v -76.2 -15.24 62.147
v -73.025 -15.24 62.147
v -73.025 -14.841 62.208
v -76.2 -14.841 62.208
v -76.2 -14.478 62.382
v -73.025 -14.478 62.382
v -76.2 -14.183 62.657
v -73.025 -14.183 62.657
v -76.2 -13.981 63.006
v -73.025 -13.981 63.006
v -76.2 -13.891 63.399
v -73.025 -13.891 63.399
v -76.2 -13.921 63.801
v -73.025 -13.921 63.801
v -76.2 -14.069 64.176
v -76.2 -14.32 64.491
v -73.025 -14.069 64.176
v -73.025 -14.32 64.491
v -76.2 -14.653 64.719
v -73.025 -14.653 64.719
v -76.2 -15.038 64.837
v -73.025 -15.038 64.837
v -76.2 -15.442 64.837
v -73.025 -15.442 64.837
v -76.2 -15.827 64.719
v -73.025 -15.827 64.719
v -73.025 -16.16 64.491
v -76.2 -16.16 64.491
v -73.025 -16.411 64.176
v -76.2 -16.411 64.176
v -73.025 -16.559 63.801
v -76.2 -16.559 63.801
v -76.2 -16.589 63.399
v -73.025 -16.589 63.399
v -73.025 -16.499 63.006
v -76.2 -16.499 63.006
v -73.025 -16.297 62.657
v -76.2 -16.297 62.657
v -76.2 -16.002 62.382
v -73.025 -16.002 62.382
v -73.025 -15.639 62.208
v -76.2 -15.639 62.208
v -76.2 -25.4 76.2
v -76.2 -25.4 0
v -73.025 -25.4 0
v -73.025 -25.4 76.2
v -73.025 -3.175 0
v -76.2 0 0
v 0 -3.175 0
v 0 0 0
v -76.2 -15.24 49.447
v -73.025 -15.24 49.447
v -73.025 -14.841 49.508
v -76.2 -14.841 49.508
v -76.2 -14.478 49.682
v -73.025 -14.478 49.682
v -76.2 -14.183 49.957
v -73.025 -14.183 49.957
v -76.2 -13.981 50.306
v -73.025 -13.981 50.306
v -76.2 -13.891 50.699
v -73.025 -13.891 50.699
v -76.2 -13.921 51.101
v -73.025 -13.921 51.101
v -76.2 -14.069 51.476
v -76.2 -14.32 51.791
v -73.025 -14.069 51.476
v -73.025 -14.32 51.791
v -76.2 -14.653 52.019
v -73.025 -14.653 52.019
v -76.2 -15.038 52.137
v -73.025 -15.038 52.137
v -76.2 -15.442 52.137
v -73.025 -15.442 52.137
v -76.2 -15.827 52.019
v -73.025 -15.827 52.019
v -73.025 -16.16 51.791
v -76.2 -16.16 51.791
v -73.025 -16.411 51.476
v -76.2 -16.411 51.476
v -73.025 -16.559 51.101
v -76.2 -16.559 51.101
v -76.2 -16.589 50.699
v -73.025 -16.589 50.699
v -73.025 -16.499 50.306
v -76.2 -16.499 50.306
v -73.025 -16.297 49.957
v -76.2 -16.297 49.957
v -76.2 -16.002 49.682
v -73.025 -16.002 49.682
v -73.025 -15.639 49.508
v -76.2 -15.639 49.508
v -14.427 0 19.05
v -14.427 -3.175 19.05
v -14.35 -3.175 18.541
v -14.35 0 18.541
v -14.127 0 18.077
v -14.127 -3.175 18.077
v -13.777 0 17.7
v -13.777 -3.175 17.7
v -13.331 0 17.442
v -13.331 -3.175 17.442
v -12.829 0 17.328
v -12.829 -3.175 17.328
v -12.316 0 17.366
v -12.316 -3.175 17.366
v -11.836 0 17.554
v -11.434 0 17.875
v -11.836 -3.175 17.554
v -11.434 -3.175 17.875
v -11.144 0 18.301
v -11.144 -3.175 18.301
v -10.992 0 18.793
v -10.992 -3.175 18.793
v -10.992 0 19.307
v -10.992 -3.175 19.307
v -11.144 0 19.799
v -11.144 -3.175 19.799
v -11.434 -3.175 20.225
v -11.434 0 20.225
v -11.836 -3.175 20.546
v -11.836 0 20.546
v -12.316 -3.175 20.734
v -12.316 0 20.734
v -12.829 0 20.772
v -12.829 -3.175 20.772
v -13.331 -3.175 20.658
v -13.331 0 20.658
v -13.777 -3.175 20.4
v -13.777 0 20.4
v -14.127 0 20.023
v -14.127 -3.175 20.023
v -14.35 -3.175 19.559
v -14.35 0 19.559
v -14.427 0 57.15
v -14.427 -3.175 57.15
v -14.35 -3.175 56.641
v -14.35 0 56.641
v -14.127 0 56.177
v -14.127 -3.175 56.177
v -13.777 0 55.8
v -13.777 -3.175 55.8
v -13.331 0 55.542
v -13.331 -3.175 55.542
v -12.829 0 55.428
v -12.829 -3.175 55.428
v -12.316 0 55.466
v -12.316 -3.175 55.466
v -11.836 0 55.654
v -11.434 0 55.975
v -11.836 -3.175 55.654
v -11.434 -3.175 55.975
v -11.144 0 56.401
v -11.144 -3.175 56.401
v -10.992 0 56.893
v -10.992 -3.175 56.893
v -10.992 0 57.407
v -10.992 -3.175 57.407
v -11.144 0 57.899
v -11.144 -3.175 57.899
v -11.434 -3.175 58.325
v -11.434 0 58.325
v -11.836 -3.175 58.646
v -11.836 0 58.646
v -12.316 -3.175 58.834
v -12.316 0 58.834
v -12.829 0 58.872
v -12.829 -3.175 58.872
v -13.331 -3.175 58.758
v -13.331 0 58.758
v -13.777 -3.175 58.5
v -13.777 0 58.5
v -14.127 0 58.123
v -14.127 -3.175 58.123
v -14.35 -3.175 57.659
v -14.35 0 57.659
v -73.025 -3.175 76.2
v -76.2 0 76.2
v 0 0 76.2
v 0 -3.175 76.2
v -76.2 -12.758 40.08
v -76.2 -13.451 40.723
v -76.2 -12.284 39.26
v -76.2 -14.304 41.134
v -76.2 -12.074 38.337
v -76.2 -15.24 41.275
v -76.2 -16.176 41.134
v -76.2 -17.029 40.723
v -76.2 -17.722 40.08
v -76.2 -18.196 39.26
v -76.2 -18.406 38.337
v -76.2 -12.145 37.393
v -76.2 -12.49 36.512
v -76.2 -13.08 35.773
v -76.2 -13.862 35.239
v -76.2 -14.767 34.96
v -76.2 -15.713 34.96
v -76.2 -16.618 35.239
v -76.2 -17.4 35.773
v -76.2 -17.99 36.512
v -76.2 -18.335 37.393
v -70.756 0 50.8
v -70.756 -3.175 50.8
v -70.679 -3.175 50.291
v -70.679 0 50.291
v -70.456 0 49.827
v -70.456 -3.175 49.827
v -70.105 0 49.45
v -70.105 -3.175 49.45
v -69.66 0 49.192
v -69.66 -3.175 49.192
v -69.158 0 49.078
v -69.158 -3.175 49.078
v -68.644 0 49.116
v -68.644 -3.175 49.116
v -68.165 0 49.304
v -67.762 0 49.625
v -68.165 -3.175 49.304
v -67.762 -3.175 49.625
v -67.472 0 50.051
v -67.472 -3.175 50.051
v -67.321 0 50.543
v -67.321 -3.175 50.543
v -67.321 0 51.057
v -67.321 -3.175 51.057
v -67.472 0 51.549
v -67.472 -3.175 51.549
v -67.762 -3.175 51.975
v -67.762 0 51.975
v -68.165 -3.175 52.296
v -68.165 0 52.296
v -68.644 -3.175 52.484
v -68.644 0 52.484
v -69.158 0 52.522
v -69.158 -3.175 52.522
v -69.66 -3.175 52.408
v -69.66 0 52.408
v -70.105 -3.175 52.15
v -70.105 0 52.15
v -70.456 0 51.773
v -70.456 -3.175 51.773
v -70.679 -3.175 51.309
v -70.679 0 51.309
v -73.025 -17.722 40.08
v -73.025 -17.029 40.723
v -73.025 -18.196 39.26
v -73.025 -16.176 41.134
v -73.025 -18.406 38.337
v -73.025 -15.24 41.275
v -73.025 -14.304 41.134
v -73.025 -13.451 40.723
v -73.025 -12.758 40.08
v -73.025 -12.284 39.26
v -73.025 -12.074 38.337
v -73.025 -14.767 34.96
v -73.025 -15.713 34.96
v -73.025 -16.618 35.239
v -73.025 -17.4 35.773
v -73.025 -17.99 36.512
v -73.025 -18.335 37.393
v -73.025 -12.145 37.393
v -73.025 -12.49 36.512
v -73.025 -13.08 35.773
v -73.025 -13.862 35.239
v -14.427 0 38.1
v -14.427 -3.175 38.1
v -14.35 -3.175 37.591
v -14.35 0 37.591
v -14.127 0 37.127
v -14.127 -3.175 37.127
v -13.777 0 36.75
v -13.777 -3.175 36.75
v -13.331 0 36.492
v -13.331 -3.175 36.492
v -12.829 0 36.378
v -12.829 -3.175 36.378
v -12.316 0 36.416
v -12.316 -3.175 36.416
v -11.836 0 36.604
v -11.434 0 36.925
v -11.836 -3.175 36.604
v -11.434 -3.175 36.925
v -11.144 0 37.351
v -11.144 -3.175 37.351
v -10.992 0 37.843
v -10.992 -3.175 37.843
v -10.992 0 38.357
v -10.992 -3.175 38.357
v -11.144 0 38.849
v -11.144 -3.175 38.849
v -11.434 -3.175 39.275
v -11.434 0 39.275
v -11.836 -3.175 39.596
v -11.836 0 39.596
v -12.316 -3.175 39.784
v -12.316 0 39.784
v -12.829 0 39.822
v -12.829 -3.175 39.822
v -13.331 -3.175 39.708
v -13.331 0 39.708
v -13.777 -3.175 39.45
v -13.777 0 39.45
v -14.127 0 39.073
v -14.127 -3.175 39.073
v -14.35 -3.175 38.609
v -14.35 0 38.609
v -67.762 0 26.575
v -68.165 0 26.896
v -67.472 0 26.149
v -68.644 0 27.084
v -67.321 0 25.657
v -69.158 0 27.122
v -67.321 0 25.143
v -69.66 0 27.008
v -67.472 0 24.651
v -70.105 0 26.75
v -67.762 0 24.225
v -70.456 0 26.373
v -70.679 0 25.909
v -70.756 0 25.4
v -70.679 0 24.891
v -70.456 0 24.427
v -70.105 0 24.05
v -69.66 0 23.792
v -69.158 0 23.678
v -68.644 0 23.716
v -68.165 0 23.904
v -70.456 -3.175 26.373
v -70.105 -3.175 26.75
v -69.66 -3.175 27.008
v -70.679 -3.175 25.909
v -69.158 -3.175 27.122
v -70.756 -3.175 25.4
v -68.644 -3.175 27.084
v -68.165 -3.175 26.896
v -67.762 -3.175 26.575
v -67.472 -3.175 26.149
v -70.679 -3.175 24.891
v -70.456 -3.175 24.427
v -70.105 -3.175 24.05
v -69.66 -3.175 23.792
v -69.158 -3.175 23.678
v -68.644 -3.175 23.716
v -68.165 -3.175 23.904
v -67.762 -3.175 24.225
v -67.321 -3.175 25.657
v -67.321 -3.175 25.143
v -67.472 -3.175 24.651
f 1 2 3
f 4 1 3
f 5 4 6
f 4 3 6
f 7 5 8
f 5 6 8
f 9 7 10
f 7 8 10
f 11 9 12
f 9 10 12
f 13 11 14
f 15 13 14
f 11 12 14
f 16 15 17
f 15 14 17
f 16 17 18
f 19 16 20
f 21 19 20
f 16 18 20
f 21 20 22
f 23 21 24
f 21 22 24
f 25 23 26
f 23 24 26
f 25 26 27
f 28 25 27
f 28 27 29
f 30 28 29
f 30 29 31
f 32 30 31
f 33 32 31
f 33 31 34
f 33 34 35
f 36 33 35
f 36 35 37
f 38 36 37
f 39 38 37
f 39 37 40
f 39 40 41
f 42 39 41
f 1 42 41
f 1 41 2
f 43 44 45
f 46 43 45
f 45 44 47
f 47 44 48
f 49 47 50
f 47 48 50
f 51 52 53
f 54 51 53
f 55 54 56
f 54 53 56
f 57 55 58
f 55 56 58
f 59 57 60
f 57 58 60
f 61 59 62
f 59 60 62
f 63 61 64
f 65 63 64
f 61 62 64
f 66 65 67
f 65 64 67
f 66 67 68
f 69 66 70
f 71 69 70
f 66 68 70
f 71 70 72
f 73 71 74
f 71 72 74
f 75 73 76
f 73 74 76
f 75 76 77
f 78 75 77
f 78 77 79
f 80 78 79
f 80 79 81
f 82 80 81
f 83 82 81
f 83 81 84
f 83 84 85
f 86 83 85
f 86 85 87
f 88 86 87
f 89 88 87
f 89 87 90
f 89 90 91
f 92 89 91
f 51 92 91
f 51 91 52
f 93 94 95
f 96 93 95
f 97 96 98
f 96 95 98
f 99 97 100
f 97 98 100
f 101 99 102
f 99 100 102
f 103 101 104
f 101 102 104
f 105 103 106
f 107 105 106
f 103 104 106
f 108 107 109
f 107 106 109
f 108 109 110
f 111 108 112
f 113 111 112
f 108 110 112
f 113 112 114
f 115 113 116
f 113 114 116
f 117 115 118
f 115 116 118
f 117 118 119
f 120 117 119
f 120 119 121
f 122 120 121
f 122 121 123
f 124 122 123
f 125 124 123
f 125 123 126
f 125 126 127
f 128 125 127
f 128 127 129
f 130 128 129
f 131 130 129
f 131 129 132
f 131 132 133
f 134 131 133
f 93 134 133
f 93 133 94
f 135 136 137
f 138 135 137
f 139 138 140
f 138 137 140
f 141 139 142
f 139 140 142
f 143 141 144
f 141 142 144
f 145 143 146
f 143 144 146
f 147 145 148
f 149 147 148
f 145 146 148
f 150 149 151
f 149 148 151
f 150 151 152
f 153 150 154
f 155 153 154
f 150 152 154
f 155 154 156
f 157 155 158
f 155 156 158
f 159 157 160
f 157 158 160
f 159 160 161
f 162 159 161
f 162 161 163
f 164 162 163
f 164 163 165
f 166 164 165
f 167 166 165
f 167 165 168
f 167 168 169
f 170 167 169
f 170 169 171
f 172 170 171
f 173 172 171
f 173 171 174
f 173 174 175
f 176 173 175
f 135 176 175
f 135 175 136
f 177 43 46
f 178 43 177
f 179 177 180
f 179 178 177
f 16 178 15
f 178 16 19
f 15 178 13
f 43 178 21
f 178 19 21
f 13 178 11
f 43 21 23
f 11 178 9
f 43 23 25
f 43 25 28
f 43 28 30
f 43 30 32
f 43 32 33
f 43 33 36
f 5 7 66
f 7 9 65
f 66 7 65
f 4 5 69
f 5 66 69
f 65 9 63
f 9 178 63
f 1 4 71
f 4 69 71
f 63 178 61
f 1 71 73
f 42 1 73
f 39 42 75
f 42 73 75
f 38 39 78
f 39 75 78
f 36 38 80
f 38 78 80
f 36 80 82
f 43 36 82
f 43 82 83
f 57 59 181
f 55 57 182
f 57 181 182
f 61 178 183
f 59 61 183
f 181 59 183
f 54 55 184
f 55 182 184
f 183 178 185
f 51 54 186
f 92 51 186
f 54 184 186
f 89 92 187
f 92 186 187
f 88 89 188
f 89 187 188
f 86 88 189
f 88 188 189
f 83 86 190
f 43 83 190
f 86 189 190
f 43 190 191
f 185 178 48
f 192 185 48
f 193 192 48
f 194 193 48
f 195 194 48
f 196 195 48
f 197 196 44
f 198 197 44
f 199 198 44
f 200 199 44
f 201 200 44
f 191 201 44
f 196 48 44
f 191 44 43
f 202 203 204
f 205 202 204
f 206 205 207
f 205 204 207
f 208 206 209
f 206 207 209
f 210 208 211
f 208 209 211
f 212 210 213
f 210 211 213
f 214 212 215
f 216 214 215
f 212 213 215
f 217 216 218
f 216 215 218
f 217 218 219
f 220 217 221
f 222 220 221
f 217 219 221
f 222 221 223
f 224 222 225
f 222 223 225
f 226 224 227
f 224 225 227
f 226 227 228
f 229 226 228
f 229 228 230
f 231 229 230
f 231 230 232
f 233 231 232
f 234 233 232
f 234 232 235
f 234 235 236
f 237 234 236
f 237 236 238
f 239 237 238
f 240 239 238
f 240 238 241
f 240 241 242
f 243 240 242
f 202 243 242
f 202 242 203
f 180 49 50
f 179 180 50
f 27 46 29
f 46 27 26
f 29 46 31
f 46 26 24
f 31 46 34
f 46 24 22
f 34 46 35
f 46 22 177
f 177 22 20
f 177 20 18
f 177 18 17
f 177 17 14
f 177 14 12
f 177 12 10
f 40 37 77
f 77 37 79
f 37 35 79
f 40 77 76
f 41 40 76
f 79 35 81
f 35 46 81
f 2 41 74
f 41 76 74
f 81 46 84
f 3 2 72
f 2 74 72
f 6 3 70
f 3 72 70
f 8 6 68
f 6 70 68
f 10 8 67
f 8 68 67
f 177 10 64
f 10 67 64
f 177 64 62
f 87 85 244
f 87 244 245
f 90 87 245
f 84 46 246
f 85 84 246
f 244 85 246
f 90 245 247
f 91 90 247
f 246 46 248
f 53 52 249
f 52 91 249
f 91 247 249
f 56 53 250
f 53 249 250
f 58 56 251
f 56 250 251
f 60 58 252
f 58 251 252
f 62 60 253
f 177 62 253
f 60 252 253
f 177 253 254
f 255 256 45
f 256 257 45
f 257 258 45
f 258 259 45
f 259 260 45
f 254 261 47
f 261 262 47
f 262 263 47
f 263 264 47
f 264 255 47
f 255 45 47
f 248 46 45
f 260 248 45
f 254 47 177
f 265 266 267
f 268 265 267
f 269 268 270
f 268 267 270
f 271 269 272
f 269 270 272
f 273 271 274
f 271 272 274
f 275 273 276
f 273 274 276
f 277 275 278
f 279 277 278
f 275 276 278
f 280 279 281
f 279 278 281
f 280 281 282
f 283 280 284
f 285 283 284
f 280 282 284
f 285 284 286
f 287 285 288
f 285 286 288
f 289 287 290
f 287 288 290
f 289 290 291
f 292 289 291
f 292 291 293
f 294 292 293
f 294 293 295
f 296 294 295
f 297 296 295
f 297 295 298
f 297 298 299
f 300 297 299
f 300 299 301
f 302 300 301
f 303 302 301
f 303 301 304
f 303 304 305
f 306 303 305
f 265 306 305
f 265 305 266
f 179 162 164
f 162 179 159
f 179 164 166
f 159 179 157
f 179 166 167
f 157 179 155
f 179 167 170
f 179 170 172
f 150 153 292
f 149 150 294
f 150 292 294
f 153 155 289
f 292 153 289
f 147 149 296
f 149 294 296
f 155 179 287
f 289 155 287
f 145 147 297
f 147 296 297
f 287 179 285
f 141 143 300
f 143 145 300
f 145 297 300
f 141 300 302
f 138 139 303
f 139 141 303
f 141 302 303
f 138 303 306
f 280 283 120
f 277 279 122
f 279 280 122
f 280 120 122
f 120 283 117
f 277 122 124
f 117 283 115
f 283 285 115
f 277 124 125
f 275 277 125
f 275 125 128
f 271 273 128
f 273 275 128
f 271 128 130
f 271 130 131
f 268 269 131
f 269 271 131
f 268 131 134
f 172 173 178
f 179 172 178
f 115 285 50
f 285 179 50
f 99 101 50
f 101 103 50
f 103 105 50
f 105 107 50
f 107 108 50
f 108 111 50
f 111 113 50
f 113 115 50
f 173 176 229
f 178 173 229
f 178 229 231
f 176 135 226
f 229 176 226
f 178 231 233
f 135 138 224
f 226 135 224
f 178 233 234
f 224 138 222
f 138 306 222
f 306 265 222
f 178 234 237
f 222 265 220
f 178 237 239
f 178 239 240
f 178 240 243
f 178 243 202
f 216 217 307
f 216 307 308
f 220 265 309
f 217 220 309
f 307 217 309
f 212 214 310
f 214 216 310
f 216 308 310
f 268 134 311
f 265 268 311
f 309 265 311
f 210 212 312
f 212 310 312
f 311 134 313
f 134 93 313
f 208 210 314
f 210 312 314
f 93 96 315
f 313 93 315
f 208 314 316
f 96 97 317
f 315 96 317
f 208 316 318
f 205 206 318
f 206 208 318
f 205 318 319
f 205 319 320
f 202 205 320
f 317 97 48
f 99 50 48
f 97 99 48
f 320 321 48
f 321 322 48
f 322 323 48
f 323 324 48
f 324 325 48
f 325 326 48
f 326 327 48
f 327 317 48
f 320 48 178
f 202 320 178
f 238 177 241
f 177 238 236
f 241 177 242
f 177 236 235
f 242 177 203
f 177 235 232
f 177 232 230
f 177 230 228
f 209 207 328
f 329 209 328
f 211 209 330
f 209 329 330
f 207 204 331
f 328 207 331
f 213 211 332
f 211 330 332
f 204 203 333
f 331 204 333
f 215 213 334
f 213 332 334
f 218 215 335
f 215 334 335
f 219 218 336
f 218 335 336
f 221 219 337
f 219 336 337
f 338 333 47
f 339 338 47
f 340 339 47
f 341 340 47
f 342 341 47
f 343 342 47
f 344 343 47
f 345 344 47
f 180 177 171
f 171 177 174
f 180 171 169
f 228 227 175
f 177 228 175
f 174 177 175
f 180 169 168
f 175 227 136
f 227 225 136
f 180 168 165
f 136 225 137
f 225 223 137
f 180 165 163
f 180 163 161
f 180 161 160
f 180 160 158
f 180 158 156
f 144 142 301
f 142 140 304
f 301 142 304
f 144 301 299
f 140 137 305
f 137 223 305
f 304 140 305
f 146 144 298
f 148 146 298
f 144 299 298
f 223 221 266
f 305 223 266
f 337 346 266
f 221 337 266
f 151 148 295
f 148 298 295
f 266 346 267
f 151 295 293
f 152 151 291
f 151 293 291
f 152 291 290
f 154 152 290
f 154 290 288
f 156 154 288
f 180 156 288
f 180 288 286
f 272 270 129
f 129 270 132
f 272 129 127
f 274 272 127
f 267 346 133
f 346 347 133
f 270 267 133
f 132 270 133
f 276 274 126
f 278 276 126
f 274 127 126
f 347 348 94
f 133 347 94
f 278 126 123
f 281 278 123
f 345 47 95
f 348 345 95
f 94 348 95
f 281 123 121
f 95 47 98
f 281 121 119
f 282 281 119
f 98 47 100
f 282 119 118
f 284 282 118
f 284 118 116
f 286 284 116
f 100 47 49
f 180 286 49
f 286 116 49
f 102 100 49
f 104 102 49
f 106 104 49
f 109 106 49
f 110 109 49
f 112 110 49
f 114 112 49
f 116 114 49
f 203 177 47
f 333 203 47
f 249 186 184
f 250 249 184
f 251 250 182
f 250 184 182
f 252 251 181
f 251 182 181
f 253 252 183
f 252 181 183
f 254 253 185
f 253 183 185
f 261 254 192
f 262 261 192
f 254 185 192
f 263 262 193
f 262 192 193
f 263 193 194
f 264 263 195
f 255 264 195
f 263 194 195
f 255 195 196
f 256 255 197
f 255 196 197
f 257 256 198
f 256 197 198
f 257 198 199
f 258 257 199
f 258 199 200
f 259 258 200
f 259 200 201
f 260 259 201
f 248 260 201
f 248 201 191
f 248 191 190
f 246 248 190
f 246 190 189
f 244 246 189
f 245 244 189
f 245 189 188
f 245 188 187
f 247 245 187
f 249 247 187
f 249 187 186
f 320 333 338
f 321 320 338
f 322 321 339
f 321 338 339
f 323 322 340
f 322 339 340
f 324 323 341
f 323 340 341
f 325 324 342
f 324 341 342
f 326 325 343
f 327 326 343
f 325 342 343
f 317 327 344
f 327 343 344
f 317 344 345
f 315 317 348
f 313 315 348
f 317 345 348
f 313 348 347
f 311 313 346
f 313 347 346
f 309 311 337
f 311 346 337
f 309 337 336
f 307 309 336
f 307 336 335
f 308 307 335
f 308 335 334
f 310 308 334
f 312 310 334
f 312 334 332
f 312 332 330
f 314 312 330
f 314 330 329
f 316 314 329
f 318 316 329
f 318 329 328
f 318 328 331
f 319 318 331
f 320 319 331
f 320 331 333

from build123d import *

# Parameters (mm, degrees)
BOSS_EXTRUDE1_DEPTH       = 76.2
CUT_EXTRUDE1_REACH        = 112.716
SKETCH7_R                 = 3.175
TAP_DRILL_FOR_8_32_TAP2_D = 3.4544
TAP_DRILL_FOR_8_32_TAP4_D = 3.4544
TAP_DRILL_FOR_6_32_TAP1_D = 2.7051


with BuildPart() as part:
    # Sketch2 → Boss-Extrude1 (new body)
    with BuildSketch(Plane.XY):
        Polygon((0, 0), (-76.2, 0), (-76.2, -25.4), (-73.025, -25.4), (-73.025, -3.175), (0, -3.175), align=None)
    extrude(amount=BOSS_EXTRUDE1_DEPTH)

    # Sketch7 → Cut-Extrude1 (cut, up to next)
    with BuildSketch(Plane.ZY.offset(76.2), mode=Mode.PRIVATE) as cut_extrude1_sk1:
        with Locations((38.1, -15.24)):
            Circle(SKETCH7_R)
    cut_extrude1_tool1 = extrude(cut_extrude1_sk1.sketch, amount=-CUT_EXTRUDE1_REACH, mode=Mode.PRIVATE) & part.part
    add(cut_extrude1_tool1.solids().sort_by_distance((-76.2, -15.24, 38.1))[0], mode=Mode.SUBTRACT)

    # Tap Drill for #8-32 Tap2 (through all)
    with Locations(Plane(origin=(0, 0, 0), x_dir=(1, 0, 0), z_dir=(0, 1, 0))):
        with Locations((-12.7, -19.05), (-12.7, -38.1), (-12.7, -57.15)):
            Hole(TAP_DRILL_FOR_8_32_TAP2_D / 2)

    # Tap Drill for #8-32 Tap4 (through all)
    with Locations(Plane(origin=(0, 0, 0), x_dir=(1, 0, 0), z_dir=(0, 1, 0))):
        with Locations((-69.028514561, -25.4), (-69.028514561, -50.8)):
            Hole(TAP_DRILL_FOR_8_32_TAP4_D / 2)

    # Tap Drill for #6-32 Tap1 (through all)
    with Locations(Plane.ZY.offset(76.2)):
        with Locations((50.8, -15.24), (63.5, -15.24)):
            Hole(TAP_DRILL_FOR_6_32_TAP1_D / 2)


solid = part.part
